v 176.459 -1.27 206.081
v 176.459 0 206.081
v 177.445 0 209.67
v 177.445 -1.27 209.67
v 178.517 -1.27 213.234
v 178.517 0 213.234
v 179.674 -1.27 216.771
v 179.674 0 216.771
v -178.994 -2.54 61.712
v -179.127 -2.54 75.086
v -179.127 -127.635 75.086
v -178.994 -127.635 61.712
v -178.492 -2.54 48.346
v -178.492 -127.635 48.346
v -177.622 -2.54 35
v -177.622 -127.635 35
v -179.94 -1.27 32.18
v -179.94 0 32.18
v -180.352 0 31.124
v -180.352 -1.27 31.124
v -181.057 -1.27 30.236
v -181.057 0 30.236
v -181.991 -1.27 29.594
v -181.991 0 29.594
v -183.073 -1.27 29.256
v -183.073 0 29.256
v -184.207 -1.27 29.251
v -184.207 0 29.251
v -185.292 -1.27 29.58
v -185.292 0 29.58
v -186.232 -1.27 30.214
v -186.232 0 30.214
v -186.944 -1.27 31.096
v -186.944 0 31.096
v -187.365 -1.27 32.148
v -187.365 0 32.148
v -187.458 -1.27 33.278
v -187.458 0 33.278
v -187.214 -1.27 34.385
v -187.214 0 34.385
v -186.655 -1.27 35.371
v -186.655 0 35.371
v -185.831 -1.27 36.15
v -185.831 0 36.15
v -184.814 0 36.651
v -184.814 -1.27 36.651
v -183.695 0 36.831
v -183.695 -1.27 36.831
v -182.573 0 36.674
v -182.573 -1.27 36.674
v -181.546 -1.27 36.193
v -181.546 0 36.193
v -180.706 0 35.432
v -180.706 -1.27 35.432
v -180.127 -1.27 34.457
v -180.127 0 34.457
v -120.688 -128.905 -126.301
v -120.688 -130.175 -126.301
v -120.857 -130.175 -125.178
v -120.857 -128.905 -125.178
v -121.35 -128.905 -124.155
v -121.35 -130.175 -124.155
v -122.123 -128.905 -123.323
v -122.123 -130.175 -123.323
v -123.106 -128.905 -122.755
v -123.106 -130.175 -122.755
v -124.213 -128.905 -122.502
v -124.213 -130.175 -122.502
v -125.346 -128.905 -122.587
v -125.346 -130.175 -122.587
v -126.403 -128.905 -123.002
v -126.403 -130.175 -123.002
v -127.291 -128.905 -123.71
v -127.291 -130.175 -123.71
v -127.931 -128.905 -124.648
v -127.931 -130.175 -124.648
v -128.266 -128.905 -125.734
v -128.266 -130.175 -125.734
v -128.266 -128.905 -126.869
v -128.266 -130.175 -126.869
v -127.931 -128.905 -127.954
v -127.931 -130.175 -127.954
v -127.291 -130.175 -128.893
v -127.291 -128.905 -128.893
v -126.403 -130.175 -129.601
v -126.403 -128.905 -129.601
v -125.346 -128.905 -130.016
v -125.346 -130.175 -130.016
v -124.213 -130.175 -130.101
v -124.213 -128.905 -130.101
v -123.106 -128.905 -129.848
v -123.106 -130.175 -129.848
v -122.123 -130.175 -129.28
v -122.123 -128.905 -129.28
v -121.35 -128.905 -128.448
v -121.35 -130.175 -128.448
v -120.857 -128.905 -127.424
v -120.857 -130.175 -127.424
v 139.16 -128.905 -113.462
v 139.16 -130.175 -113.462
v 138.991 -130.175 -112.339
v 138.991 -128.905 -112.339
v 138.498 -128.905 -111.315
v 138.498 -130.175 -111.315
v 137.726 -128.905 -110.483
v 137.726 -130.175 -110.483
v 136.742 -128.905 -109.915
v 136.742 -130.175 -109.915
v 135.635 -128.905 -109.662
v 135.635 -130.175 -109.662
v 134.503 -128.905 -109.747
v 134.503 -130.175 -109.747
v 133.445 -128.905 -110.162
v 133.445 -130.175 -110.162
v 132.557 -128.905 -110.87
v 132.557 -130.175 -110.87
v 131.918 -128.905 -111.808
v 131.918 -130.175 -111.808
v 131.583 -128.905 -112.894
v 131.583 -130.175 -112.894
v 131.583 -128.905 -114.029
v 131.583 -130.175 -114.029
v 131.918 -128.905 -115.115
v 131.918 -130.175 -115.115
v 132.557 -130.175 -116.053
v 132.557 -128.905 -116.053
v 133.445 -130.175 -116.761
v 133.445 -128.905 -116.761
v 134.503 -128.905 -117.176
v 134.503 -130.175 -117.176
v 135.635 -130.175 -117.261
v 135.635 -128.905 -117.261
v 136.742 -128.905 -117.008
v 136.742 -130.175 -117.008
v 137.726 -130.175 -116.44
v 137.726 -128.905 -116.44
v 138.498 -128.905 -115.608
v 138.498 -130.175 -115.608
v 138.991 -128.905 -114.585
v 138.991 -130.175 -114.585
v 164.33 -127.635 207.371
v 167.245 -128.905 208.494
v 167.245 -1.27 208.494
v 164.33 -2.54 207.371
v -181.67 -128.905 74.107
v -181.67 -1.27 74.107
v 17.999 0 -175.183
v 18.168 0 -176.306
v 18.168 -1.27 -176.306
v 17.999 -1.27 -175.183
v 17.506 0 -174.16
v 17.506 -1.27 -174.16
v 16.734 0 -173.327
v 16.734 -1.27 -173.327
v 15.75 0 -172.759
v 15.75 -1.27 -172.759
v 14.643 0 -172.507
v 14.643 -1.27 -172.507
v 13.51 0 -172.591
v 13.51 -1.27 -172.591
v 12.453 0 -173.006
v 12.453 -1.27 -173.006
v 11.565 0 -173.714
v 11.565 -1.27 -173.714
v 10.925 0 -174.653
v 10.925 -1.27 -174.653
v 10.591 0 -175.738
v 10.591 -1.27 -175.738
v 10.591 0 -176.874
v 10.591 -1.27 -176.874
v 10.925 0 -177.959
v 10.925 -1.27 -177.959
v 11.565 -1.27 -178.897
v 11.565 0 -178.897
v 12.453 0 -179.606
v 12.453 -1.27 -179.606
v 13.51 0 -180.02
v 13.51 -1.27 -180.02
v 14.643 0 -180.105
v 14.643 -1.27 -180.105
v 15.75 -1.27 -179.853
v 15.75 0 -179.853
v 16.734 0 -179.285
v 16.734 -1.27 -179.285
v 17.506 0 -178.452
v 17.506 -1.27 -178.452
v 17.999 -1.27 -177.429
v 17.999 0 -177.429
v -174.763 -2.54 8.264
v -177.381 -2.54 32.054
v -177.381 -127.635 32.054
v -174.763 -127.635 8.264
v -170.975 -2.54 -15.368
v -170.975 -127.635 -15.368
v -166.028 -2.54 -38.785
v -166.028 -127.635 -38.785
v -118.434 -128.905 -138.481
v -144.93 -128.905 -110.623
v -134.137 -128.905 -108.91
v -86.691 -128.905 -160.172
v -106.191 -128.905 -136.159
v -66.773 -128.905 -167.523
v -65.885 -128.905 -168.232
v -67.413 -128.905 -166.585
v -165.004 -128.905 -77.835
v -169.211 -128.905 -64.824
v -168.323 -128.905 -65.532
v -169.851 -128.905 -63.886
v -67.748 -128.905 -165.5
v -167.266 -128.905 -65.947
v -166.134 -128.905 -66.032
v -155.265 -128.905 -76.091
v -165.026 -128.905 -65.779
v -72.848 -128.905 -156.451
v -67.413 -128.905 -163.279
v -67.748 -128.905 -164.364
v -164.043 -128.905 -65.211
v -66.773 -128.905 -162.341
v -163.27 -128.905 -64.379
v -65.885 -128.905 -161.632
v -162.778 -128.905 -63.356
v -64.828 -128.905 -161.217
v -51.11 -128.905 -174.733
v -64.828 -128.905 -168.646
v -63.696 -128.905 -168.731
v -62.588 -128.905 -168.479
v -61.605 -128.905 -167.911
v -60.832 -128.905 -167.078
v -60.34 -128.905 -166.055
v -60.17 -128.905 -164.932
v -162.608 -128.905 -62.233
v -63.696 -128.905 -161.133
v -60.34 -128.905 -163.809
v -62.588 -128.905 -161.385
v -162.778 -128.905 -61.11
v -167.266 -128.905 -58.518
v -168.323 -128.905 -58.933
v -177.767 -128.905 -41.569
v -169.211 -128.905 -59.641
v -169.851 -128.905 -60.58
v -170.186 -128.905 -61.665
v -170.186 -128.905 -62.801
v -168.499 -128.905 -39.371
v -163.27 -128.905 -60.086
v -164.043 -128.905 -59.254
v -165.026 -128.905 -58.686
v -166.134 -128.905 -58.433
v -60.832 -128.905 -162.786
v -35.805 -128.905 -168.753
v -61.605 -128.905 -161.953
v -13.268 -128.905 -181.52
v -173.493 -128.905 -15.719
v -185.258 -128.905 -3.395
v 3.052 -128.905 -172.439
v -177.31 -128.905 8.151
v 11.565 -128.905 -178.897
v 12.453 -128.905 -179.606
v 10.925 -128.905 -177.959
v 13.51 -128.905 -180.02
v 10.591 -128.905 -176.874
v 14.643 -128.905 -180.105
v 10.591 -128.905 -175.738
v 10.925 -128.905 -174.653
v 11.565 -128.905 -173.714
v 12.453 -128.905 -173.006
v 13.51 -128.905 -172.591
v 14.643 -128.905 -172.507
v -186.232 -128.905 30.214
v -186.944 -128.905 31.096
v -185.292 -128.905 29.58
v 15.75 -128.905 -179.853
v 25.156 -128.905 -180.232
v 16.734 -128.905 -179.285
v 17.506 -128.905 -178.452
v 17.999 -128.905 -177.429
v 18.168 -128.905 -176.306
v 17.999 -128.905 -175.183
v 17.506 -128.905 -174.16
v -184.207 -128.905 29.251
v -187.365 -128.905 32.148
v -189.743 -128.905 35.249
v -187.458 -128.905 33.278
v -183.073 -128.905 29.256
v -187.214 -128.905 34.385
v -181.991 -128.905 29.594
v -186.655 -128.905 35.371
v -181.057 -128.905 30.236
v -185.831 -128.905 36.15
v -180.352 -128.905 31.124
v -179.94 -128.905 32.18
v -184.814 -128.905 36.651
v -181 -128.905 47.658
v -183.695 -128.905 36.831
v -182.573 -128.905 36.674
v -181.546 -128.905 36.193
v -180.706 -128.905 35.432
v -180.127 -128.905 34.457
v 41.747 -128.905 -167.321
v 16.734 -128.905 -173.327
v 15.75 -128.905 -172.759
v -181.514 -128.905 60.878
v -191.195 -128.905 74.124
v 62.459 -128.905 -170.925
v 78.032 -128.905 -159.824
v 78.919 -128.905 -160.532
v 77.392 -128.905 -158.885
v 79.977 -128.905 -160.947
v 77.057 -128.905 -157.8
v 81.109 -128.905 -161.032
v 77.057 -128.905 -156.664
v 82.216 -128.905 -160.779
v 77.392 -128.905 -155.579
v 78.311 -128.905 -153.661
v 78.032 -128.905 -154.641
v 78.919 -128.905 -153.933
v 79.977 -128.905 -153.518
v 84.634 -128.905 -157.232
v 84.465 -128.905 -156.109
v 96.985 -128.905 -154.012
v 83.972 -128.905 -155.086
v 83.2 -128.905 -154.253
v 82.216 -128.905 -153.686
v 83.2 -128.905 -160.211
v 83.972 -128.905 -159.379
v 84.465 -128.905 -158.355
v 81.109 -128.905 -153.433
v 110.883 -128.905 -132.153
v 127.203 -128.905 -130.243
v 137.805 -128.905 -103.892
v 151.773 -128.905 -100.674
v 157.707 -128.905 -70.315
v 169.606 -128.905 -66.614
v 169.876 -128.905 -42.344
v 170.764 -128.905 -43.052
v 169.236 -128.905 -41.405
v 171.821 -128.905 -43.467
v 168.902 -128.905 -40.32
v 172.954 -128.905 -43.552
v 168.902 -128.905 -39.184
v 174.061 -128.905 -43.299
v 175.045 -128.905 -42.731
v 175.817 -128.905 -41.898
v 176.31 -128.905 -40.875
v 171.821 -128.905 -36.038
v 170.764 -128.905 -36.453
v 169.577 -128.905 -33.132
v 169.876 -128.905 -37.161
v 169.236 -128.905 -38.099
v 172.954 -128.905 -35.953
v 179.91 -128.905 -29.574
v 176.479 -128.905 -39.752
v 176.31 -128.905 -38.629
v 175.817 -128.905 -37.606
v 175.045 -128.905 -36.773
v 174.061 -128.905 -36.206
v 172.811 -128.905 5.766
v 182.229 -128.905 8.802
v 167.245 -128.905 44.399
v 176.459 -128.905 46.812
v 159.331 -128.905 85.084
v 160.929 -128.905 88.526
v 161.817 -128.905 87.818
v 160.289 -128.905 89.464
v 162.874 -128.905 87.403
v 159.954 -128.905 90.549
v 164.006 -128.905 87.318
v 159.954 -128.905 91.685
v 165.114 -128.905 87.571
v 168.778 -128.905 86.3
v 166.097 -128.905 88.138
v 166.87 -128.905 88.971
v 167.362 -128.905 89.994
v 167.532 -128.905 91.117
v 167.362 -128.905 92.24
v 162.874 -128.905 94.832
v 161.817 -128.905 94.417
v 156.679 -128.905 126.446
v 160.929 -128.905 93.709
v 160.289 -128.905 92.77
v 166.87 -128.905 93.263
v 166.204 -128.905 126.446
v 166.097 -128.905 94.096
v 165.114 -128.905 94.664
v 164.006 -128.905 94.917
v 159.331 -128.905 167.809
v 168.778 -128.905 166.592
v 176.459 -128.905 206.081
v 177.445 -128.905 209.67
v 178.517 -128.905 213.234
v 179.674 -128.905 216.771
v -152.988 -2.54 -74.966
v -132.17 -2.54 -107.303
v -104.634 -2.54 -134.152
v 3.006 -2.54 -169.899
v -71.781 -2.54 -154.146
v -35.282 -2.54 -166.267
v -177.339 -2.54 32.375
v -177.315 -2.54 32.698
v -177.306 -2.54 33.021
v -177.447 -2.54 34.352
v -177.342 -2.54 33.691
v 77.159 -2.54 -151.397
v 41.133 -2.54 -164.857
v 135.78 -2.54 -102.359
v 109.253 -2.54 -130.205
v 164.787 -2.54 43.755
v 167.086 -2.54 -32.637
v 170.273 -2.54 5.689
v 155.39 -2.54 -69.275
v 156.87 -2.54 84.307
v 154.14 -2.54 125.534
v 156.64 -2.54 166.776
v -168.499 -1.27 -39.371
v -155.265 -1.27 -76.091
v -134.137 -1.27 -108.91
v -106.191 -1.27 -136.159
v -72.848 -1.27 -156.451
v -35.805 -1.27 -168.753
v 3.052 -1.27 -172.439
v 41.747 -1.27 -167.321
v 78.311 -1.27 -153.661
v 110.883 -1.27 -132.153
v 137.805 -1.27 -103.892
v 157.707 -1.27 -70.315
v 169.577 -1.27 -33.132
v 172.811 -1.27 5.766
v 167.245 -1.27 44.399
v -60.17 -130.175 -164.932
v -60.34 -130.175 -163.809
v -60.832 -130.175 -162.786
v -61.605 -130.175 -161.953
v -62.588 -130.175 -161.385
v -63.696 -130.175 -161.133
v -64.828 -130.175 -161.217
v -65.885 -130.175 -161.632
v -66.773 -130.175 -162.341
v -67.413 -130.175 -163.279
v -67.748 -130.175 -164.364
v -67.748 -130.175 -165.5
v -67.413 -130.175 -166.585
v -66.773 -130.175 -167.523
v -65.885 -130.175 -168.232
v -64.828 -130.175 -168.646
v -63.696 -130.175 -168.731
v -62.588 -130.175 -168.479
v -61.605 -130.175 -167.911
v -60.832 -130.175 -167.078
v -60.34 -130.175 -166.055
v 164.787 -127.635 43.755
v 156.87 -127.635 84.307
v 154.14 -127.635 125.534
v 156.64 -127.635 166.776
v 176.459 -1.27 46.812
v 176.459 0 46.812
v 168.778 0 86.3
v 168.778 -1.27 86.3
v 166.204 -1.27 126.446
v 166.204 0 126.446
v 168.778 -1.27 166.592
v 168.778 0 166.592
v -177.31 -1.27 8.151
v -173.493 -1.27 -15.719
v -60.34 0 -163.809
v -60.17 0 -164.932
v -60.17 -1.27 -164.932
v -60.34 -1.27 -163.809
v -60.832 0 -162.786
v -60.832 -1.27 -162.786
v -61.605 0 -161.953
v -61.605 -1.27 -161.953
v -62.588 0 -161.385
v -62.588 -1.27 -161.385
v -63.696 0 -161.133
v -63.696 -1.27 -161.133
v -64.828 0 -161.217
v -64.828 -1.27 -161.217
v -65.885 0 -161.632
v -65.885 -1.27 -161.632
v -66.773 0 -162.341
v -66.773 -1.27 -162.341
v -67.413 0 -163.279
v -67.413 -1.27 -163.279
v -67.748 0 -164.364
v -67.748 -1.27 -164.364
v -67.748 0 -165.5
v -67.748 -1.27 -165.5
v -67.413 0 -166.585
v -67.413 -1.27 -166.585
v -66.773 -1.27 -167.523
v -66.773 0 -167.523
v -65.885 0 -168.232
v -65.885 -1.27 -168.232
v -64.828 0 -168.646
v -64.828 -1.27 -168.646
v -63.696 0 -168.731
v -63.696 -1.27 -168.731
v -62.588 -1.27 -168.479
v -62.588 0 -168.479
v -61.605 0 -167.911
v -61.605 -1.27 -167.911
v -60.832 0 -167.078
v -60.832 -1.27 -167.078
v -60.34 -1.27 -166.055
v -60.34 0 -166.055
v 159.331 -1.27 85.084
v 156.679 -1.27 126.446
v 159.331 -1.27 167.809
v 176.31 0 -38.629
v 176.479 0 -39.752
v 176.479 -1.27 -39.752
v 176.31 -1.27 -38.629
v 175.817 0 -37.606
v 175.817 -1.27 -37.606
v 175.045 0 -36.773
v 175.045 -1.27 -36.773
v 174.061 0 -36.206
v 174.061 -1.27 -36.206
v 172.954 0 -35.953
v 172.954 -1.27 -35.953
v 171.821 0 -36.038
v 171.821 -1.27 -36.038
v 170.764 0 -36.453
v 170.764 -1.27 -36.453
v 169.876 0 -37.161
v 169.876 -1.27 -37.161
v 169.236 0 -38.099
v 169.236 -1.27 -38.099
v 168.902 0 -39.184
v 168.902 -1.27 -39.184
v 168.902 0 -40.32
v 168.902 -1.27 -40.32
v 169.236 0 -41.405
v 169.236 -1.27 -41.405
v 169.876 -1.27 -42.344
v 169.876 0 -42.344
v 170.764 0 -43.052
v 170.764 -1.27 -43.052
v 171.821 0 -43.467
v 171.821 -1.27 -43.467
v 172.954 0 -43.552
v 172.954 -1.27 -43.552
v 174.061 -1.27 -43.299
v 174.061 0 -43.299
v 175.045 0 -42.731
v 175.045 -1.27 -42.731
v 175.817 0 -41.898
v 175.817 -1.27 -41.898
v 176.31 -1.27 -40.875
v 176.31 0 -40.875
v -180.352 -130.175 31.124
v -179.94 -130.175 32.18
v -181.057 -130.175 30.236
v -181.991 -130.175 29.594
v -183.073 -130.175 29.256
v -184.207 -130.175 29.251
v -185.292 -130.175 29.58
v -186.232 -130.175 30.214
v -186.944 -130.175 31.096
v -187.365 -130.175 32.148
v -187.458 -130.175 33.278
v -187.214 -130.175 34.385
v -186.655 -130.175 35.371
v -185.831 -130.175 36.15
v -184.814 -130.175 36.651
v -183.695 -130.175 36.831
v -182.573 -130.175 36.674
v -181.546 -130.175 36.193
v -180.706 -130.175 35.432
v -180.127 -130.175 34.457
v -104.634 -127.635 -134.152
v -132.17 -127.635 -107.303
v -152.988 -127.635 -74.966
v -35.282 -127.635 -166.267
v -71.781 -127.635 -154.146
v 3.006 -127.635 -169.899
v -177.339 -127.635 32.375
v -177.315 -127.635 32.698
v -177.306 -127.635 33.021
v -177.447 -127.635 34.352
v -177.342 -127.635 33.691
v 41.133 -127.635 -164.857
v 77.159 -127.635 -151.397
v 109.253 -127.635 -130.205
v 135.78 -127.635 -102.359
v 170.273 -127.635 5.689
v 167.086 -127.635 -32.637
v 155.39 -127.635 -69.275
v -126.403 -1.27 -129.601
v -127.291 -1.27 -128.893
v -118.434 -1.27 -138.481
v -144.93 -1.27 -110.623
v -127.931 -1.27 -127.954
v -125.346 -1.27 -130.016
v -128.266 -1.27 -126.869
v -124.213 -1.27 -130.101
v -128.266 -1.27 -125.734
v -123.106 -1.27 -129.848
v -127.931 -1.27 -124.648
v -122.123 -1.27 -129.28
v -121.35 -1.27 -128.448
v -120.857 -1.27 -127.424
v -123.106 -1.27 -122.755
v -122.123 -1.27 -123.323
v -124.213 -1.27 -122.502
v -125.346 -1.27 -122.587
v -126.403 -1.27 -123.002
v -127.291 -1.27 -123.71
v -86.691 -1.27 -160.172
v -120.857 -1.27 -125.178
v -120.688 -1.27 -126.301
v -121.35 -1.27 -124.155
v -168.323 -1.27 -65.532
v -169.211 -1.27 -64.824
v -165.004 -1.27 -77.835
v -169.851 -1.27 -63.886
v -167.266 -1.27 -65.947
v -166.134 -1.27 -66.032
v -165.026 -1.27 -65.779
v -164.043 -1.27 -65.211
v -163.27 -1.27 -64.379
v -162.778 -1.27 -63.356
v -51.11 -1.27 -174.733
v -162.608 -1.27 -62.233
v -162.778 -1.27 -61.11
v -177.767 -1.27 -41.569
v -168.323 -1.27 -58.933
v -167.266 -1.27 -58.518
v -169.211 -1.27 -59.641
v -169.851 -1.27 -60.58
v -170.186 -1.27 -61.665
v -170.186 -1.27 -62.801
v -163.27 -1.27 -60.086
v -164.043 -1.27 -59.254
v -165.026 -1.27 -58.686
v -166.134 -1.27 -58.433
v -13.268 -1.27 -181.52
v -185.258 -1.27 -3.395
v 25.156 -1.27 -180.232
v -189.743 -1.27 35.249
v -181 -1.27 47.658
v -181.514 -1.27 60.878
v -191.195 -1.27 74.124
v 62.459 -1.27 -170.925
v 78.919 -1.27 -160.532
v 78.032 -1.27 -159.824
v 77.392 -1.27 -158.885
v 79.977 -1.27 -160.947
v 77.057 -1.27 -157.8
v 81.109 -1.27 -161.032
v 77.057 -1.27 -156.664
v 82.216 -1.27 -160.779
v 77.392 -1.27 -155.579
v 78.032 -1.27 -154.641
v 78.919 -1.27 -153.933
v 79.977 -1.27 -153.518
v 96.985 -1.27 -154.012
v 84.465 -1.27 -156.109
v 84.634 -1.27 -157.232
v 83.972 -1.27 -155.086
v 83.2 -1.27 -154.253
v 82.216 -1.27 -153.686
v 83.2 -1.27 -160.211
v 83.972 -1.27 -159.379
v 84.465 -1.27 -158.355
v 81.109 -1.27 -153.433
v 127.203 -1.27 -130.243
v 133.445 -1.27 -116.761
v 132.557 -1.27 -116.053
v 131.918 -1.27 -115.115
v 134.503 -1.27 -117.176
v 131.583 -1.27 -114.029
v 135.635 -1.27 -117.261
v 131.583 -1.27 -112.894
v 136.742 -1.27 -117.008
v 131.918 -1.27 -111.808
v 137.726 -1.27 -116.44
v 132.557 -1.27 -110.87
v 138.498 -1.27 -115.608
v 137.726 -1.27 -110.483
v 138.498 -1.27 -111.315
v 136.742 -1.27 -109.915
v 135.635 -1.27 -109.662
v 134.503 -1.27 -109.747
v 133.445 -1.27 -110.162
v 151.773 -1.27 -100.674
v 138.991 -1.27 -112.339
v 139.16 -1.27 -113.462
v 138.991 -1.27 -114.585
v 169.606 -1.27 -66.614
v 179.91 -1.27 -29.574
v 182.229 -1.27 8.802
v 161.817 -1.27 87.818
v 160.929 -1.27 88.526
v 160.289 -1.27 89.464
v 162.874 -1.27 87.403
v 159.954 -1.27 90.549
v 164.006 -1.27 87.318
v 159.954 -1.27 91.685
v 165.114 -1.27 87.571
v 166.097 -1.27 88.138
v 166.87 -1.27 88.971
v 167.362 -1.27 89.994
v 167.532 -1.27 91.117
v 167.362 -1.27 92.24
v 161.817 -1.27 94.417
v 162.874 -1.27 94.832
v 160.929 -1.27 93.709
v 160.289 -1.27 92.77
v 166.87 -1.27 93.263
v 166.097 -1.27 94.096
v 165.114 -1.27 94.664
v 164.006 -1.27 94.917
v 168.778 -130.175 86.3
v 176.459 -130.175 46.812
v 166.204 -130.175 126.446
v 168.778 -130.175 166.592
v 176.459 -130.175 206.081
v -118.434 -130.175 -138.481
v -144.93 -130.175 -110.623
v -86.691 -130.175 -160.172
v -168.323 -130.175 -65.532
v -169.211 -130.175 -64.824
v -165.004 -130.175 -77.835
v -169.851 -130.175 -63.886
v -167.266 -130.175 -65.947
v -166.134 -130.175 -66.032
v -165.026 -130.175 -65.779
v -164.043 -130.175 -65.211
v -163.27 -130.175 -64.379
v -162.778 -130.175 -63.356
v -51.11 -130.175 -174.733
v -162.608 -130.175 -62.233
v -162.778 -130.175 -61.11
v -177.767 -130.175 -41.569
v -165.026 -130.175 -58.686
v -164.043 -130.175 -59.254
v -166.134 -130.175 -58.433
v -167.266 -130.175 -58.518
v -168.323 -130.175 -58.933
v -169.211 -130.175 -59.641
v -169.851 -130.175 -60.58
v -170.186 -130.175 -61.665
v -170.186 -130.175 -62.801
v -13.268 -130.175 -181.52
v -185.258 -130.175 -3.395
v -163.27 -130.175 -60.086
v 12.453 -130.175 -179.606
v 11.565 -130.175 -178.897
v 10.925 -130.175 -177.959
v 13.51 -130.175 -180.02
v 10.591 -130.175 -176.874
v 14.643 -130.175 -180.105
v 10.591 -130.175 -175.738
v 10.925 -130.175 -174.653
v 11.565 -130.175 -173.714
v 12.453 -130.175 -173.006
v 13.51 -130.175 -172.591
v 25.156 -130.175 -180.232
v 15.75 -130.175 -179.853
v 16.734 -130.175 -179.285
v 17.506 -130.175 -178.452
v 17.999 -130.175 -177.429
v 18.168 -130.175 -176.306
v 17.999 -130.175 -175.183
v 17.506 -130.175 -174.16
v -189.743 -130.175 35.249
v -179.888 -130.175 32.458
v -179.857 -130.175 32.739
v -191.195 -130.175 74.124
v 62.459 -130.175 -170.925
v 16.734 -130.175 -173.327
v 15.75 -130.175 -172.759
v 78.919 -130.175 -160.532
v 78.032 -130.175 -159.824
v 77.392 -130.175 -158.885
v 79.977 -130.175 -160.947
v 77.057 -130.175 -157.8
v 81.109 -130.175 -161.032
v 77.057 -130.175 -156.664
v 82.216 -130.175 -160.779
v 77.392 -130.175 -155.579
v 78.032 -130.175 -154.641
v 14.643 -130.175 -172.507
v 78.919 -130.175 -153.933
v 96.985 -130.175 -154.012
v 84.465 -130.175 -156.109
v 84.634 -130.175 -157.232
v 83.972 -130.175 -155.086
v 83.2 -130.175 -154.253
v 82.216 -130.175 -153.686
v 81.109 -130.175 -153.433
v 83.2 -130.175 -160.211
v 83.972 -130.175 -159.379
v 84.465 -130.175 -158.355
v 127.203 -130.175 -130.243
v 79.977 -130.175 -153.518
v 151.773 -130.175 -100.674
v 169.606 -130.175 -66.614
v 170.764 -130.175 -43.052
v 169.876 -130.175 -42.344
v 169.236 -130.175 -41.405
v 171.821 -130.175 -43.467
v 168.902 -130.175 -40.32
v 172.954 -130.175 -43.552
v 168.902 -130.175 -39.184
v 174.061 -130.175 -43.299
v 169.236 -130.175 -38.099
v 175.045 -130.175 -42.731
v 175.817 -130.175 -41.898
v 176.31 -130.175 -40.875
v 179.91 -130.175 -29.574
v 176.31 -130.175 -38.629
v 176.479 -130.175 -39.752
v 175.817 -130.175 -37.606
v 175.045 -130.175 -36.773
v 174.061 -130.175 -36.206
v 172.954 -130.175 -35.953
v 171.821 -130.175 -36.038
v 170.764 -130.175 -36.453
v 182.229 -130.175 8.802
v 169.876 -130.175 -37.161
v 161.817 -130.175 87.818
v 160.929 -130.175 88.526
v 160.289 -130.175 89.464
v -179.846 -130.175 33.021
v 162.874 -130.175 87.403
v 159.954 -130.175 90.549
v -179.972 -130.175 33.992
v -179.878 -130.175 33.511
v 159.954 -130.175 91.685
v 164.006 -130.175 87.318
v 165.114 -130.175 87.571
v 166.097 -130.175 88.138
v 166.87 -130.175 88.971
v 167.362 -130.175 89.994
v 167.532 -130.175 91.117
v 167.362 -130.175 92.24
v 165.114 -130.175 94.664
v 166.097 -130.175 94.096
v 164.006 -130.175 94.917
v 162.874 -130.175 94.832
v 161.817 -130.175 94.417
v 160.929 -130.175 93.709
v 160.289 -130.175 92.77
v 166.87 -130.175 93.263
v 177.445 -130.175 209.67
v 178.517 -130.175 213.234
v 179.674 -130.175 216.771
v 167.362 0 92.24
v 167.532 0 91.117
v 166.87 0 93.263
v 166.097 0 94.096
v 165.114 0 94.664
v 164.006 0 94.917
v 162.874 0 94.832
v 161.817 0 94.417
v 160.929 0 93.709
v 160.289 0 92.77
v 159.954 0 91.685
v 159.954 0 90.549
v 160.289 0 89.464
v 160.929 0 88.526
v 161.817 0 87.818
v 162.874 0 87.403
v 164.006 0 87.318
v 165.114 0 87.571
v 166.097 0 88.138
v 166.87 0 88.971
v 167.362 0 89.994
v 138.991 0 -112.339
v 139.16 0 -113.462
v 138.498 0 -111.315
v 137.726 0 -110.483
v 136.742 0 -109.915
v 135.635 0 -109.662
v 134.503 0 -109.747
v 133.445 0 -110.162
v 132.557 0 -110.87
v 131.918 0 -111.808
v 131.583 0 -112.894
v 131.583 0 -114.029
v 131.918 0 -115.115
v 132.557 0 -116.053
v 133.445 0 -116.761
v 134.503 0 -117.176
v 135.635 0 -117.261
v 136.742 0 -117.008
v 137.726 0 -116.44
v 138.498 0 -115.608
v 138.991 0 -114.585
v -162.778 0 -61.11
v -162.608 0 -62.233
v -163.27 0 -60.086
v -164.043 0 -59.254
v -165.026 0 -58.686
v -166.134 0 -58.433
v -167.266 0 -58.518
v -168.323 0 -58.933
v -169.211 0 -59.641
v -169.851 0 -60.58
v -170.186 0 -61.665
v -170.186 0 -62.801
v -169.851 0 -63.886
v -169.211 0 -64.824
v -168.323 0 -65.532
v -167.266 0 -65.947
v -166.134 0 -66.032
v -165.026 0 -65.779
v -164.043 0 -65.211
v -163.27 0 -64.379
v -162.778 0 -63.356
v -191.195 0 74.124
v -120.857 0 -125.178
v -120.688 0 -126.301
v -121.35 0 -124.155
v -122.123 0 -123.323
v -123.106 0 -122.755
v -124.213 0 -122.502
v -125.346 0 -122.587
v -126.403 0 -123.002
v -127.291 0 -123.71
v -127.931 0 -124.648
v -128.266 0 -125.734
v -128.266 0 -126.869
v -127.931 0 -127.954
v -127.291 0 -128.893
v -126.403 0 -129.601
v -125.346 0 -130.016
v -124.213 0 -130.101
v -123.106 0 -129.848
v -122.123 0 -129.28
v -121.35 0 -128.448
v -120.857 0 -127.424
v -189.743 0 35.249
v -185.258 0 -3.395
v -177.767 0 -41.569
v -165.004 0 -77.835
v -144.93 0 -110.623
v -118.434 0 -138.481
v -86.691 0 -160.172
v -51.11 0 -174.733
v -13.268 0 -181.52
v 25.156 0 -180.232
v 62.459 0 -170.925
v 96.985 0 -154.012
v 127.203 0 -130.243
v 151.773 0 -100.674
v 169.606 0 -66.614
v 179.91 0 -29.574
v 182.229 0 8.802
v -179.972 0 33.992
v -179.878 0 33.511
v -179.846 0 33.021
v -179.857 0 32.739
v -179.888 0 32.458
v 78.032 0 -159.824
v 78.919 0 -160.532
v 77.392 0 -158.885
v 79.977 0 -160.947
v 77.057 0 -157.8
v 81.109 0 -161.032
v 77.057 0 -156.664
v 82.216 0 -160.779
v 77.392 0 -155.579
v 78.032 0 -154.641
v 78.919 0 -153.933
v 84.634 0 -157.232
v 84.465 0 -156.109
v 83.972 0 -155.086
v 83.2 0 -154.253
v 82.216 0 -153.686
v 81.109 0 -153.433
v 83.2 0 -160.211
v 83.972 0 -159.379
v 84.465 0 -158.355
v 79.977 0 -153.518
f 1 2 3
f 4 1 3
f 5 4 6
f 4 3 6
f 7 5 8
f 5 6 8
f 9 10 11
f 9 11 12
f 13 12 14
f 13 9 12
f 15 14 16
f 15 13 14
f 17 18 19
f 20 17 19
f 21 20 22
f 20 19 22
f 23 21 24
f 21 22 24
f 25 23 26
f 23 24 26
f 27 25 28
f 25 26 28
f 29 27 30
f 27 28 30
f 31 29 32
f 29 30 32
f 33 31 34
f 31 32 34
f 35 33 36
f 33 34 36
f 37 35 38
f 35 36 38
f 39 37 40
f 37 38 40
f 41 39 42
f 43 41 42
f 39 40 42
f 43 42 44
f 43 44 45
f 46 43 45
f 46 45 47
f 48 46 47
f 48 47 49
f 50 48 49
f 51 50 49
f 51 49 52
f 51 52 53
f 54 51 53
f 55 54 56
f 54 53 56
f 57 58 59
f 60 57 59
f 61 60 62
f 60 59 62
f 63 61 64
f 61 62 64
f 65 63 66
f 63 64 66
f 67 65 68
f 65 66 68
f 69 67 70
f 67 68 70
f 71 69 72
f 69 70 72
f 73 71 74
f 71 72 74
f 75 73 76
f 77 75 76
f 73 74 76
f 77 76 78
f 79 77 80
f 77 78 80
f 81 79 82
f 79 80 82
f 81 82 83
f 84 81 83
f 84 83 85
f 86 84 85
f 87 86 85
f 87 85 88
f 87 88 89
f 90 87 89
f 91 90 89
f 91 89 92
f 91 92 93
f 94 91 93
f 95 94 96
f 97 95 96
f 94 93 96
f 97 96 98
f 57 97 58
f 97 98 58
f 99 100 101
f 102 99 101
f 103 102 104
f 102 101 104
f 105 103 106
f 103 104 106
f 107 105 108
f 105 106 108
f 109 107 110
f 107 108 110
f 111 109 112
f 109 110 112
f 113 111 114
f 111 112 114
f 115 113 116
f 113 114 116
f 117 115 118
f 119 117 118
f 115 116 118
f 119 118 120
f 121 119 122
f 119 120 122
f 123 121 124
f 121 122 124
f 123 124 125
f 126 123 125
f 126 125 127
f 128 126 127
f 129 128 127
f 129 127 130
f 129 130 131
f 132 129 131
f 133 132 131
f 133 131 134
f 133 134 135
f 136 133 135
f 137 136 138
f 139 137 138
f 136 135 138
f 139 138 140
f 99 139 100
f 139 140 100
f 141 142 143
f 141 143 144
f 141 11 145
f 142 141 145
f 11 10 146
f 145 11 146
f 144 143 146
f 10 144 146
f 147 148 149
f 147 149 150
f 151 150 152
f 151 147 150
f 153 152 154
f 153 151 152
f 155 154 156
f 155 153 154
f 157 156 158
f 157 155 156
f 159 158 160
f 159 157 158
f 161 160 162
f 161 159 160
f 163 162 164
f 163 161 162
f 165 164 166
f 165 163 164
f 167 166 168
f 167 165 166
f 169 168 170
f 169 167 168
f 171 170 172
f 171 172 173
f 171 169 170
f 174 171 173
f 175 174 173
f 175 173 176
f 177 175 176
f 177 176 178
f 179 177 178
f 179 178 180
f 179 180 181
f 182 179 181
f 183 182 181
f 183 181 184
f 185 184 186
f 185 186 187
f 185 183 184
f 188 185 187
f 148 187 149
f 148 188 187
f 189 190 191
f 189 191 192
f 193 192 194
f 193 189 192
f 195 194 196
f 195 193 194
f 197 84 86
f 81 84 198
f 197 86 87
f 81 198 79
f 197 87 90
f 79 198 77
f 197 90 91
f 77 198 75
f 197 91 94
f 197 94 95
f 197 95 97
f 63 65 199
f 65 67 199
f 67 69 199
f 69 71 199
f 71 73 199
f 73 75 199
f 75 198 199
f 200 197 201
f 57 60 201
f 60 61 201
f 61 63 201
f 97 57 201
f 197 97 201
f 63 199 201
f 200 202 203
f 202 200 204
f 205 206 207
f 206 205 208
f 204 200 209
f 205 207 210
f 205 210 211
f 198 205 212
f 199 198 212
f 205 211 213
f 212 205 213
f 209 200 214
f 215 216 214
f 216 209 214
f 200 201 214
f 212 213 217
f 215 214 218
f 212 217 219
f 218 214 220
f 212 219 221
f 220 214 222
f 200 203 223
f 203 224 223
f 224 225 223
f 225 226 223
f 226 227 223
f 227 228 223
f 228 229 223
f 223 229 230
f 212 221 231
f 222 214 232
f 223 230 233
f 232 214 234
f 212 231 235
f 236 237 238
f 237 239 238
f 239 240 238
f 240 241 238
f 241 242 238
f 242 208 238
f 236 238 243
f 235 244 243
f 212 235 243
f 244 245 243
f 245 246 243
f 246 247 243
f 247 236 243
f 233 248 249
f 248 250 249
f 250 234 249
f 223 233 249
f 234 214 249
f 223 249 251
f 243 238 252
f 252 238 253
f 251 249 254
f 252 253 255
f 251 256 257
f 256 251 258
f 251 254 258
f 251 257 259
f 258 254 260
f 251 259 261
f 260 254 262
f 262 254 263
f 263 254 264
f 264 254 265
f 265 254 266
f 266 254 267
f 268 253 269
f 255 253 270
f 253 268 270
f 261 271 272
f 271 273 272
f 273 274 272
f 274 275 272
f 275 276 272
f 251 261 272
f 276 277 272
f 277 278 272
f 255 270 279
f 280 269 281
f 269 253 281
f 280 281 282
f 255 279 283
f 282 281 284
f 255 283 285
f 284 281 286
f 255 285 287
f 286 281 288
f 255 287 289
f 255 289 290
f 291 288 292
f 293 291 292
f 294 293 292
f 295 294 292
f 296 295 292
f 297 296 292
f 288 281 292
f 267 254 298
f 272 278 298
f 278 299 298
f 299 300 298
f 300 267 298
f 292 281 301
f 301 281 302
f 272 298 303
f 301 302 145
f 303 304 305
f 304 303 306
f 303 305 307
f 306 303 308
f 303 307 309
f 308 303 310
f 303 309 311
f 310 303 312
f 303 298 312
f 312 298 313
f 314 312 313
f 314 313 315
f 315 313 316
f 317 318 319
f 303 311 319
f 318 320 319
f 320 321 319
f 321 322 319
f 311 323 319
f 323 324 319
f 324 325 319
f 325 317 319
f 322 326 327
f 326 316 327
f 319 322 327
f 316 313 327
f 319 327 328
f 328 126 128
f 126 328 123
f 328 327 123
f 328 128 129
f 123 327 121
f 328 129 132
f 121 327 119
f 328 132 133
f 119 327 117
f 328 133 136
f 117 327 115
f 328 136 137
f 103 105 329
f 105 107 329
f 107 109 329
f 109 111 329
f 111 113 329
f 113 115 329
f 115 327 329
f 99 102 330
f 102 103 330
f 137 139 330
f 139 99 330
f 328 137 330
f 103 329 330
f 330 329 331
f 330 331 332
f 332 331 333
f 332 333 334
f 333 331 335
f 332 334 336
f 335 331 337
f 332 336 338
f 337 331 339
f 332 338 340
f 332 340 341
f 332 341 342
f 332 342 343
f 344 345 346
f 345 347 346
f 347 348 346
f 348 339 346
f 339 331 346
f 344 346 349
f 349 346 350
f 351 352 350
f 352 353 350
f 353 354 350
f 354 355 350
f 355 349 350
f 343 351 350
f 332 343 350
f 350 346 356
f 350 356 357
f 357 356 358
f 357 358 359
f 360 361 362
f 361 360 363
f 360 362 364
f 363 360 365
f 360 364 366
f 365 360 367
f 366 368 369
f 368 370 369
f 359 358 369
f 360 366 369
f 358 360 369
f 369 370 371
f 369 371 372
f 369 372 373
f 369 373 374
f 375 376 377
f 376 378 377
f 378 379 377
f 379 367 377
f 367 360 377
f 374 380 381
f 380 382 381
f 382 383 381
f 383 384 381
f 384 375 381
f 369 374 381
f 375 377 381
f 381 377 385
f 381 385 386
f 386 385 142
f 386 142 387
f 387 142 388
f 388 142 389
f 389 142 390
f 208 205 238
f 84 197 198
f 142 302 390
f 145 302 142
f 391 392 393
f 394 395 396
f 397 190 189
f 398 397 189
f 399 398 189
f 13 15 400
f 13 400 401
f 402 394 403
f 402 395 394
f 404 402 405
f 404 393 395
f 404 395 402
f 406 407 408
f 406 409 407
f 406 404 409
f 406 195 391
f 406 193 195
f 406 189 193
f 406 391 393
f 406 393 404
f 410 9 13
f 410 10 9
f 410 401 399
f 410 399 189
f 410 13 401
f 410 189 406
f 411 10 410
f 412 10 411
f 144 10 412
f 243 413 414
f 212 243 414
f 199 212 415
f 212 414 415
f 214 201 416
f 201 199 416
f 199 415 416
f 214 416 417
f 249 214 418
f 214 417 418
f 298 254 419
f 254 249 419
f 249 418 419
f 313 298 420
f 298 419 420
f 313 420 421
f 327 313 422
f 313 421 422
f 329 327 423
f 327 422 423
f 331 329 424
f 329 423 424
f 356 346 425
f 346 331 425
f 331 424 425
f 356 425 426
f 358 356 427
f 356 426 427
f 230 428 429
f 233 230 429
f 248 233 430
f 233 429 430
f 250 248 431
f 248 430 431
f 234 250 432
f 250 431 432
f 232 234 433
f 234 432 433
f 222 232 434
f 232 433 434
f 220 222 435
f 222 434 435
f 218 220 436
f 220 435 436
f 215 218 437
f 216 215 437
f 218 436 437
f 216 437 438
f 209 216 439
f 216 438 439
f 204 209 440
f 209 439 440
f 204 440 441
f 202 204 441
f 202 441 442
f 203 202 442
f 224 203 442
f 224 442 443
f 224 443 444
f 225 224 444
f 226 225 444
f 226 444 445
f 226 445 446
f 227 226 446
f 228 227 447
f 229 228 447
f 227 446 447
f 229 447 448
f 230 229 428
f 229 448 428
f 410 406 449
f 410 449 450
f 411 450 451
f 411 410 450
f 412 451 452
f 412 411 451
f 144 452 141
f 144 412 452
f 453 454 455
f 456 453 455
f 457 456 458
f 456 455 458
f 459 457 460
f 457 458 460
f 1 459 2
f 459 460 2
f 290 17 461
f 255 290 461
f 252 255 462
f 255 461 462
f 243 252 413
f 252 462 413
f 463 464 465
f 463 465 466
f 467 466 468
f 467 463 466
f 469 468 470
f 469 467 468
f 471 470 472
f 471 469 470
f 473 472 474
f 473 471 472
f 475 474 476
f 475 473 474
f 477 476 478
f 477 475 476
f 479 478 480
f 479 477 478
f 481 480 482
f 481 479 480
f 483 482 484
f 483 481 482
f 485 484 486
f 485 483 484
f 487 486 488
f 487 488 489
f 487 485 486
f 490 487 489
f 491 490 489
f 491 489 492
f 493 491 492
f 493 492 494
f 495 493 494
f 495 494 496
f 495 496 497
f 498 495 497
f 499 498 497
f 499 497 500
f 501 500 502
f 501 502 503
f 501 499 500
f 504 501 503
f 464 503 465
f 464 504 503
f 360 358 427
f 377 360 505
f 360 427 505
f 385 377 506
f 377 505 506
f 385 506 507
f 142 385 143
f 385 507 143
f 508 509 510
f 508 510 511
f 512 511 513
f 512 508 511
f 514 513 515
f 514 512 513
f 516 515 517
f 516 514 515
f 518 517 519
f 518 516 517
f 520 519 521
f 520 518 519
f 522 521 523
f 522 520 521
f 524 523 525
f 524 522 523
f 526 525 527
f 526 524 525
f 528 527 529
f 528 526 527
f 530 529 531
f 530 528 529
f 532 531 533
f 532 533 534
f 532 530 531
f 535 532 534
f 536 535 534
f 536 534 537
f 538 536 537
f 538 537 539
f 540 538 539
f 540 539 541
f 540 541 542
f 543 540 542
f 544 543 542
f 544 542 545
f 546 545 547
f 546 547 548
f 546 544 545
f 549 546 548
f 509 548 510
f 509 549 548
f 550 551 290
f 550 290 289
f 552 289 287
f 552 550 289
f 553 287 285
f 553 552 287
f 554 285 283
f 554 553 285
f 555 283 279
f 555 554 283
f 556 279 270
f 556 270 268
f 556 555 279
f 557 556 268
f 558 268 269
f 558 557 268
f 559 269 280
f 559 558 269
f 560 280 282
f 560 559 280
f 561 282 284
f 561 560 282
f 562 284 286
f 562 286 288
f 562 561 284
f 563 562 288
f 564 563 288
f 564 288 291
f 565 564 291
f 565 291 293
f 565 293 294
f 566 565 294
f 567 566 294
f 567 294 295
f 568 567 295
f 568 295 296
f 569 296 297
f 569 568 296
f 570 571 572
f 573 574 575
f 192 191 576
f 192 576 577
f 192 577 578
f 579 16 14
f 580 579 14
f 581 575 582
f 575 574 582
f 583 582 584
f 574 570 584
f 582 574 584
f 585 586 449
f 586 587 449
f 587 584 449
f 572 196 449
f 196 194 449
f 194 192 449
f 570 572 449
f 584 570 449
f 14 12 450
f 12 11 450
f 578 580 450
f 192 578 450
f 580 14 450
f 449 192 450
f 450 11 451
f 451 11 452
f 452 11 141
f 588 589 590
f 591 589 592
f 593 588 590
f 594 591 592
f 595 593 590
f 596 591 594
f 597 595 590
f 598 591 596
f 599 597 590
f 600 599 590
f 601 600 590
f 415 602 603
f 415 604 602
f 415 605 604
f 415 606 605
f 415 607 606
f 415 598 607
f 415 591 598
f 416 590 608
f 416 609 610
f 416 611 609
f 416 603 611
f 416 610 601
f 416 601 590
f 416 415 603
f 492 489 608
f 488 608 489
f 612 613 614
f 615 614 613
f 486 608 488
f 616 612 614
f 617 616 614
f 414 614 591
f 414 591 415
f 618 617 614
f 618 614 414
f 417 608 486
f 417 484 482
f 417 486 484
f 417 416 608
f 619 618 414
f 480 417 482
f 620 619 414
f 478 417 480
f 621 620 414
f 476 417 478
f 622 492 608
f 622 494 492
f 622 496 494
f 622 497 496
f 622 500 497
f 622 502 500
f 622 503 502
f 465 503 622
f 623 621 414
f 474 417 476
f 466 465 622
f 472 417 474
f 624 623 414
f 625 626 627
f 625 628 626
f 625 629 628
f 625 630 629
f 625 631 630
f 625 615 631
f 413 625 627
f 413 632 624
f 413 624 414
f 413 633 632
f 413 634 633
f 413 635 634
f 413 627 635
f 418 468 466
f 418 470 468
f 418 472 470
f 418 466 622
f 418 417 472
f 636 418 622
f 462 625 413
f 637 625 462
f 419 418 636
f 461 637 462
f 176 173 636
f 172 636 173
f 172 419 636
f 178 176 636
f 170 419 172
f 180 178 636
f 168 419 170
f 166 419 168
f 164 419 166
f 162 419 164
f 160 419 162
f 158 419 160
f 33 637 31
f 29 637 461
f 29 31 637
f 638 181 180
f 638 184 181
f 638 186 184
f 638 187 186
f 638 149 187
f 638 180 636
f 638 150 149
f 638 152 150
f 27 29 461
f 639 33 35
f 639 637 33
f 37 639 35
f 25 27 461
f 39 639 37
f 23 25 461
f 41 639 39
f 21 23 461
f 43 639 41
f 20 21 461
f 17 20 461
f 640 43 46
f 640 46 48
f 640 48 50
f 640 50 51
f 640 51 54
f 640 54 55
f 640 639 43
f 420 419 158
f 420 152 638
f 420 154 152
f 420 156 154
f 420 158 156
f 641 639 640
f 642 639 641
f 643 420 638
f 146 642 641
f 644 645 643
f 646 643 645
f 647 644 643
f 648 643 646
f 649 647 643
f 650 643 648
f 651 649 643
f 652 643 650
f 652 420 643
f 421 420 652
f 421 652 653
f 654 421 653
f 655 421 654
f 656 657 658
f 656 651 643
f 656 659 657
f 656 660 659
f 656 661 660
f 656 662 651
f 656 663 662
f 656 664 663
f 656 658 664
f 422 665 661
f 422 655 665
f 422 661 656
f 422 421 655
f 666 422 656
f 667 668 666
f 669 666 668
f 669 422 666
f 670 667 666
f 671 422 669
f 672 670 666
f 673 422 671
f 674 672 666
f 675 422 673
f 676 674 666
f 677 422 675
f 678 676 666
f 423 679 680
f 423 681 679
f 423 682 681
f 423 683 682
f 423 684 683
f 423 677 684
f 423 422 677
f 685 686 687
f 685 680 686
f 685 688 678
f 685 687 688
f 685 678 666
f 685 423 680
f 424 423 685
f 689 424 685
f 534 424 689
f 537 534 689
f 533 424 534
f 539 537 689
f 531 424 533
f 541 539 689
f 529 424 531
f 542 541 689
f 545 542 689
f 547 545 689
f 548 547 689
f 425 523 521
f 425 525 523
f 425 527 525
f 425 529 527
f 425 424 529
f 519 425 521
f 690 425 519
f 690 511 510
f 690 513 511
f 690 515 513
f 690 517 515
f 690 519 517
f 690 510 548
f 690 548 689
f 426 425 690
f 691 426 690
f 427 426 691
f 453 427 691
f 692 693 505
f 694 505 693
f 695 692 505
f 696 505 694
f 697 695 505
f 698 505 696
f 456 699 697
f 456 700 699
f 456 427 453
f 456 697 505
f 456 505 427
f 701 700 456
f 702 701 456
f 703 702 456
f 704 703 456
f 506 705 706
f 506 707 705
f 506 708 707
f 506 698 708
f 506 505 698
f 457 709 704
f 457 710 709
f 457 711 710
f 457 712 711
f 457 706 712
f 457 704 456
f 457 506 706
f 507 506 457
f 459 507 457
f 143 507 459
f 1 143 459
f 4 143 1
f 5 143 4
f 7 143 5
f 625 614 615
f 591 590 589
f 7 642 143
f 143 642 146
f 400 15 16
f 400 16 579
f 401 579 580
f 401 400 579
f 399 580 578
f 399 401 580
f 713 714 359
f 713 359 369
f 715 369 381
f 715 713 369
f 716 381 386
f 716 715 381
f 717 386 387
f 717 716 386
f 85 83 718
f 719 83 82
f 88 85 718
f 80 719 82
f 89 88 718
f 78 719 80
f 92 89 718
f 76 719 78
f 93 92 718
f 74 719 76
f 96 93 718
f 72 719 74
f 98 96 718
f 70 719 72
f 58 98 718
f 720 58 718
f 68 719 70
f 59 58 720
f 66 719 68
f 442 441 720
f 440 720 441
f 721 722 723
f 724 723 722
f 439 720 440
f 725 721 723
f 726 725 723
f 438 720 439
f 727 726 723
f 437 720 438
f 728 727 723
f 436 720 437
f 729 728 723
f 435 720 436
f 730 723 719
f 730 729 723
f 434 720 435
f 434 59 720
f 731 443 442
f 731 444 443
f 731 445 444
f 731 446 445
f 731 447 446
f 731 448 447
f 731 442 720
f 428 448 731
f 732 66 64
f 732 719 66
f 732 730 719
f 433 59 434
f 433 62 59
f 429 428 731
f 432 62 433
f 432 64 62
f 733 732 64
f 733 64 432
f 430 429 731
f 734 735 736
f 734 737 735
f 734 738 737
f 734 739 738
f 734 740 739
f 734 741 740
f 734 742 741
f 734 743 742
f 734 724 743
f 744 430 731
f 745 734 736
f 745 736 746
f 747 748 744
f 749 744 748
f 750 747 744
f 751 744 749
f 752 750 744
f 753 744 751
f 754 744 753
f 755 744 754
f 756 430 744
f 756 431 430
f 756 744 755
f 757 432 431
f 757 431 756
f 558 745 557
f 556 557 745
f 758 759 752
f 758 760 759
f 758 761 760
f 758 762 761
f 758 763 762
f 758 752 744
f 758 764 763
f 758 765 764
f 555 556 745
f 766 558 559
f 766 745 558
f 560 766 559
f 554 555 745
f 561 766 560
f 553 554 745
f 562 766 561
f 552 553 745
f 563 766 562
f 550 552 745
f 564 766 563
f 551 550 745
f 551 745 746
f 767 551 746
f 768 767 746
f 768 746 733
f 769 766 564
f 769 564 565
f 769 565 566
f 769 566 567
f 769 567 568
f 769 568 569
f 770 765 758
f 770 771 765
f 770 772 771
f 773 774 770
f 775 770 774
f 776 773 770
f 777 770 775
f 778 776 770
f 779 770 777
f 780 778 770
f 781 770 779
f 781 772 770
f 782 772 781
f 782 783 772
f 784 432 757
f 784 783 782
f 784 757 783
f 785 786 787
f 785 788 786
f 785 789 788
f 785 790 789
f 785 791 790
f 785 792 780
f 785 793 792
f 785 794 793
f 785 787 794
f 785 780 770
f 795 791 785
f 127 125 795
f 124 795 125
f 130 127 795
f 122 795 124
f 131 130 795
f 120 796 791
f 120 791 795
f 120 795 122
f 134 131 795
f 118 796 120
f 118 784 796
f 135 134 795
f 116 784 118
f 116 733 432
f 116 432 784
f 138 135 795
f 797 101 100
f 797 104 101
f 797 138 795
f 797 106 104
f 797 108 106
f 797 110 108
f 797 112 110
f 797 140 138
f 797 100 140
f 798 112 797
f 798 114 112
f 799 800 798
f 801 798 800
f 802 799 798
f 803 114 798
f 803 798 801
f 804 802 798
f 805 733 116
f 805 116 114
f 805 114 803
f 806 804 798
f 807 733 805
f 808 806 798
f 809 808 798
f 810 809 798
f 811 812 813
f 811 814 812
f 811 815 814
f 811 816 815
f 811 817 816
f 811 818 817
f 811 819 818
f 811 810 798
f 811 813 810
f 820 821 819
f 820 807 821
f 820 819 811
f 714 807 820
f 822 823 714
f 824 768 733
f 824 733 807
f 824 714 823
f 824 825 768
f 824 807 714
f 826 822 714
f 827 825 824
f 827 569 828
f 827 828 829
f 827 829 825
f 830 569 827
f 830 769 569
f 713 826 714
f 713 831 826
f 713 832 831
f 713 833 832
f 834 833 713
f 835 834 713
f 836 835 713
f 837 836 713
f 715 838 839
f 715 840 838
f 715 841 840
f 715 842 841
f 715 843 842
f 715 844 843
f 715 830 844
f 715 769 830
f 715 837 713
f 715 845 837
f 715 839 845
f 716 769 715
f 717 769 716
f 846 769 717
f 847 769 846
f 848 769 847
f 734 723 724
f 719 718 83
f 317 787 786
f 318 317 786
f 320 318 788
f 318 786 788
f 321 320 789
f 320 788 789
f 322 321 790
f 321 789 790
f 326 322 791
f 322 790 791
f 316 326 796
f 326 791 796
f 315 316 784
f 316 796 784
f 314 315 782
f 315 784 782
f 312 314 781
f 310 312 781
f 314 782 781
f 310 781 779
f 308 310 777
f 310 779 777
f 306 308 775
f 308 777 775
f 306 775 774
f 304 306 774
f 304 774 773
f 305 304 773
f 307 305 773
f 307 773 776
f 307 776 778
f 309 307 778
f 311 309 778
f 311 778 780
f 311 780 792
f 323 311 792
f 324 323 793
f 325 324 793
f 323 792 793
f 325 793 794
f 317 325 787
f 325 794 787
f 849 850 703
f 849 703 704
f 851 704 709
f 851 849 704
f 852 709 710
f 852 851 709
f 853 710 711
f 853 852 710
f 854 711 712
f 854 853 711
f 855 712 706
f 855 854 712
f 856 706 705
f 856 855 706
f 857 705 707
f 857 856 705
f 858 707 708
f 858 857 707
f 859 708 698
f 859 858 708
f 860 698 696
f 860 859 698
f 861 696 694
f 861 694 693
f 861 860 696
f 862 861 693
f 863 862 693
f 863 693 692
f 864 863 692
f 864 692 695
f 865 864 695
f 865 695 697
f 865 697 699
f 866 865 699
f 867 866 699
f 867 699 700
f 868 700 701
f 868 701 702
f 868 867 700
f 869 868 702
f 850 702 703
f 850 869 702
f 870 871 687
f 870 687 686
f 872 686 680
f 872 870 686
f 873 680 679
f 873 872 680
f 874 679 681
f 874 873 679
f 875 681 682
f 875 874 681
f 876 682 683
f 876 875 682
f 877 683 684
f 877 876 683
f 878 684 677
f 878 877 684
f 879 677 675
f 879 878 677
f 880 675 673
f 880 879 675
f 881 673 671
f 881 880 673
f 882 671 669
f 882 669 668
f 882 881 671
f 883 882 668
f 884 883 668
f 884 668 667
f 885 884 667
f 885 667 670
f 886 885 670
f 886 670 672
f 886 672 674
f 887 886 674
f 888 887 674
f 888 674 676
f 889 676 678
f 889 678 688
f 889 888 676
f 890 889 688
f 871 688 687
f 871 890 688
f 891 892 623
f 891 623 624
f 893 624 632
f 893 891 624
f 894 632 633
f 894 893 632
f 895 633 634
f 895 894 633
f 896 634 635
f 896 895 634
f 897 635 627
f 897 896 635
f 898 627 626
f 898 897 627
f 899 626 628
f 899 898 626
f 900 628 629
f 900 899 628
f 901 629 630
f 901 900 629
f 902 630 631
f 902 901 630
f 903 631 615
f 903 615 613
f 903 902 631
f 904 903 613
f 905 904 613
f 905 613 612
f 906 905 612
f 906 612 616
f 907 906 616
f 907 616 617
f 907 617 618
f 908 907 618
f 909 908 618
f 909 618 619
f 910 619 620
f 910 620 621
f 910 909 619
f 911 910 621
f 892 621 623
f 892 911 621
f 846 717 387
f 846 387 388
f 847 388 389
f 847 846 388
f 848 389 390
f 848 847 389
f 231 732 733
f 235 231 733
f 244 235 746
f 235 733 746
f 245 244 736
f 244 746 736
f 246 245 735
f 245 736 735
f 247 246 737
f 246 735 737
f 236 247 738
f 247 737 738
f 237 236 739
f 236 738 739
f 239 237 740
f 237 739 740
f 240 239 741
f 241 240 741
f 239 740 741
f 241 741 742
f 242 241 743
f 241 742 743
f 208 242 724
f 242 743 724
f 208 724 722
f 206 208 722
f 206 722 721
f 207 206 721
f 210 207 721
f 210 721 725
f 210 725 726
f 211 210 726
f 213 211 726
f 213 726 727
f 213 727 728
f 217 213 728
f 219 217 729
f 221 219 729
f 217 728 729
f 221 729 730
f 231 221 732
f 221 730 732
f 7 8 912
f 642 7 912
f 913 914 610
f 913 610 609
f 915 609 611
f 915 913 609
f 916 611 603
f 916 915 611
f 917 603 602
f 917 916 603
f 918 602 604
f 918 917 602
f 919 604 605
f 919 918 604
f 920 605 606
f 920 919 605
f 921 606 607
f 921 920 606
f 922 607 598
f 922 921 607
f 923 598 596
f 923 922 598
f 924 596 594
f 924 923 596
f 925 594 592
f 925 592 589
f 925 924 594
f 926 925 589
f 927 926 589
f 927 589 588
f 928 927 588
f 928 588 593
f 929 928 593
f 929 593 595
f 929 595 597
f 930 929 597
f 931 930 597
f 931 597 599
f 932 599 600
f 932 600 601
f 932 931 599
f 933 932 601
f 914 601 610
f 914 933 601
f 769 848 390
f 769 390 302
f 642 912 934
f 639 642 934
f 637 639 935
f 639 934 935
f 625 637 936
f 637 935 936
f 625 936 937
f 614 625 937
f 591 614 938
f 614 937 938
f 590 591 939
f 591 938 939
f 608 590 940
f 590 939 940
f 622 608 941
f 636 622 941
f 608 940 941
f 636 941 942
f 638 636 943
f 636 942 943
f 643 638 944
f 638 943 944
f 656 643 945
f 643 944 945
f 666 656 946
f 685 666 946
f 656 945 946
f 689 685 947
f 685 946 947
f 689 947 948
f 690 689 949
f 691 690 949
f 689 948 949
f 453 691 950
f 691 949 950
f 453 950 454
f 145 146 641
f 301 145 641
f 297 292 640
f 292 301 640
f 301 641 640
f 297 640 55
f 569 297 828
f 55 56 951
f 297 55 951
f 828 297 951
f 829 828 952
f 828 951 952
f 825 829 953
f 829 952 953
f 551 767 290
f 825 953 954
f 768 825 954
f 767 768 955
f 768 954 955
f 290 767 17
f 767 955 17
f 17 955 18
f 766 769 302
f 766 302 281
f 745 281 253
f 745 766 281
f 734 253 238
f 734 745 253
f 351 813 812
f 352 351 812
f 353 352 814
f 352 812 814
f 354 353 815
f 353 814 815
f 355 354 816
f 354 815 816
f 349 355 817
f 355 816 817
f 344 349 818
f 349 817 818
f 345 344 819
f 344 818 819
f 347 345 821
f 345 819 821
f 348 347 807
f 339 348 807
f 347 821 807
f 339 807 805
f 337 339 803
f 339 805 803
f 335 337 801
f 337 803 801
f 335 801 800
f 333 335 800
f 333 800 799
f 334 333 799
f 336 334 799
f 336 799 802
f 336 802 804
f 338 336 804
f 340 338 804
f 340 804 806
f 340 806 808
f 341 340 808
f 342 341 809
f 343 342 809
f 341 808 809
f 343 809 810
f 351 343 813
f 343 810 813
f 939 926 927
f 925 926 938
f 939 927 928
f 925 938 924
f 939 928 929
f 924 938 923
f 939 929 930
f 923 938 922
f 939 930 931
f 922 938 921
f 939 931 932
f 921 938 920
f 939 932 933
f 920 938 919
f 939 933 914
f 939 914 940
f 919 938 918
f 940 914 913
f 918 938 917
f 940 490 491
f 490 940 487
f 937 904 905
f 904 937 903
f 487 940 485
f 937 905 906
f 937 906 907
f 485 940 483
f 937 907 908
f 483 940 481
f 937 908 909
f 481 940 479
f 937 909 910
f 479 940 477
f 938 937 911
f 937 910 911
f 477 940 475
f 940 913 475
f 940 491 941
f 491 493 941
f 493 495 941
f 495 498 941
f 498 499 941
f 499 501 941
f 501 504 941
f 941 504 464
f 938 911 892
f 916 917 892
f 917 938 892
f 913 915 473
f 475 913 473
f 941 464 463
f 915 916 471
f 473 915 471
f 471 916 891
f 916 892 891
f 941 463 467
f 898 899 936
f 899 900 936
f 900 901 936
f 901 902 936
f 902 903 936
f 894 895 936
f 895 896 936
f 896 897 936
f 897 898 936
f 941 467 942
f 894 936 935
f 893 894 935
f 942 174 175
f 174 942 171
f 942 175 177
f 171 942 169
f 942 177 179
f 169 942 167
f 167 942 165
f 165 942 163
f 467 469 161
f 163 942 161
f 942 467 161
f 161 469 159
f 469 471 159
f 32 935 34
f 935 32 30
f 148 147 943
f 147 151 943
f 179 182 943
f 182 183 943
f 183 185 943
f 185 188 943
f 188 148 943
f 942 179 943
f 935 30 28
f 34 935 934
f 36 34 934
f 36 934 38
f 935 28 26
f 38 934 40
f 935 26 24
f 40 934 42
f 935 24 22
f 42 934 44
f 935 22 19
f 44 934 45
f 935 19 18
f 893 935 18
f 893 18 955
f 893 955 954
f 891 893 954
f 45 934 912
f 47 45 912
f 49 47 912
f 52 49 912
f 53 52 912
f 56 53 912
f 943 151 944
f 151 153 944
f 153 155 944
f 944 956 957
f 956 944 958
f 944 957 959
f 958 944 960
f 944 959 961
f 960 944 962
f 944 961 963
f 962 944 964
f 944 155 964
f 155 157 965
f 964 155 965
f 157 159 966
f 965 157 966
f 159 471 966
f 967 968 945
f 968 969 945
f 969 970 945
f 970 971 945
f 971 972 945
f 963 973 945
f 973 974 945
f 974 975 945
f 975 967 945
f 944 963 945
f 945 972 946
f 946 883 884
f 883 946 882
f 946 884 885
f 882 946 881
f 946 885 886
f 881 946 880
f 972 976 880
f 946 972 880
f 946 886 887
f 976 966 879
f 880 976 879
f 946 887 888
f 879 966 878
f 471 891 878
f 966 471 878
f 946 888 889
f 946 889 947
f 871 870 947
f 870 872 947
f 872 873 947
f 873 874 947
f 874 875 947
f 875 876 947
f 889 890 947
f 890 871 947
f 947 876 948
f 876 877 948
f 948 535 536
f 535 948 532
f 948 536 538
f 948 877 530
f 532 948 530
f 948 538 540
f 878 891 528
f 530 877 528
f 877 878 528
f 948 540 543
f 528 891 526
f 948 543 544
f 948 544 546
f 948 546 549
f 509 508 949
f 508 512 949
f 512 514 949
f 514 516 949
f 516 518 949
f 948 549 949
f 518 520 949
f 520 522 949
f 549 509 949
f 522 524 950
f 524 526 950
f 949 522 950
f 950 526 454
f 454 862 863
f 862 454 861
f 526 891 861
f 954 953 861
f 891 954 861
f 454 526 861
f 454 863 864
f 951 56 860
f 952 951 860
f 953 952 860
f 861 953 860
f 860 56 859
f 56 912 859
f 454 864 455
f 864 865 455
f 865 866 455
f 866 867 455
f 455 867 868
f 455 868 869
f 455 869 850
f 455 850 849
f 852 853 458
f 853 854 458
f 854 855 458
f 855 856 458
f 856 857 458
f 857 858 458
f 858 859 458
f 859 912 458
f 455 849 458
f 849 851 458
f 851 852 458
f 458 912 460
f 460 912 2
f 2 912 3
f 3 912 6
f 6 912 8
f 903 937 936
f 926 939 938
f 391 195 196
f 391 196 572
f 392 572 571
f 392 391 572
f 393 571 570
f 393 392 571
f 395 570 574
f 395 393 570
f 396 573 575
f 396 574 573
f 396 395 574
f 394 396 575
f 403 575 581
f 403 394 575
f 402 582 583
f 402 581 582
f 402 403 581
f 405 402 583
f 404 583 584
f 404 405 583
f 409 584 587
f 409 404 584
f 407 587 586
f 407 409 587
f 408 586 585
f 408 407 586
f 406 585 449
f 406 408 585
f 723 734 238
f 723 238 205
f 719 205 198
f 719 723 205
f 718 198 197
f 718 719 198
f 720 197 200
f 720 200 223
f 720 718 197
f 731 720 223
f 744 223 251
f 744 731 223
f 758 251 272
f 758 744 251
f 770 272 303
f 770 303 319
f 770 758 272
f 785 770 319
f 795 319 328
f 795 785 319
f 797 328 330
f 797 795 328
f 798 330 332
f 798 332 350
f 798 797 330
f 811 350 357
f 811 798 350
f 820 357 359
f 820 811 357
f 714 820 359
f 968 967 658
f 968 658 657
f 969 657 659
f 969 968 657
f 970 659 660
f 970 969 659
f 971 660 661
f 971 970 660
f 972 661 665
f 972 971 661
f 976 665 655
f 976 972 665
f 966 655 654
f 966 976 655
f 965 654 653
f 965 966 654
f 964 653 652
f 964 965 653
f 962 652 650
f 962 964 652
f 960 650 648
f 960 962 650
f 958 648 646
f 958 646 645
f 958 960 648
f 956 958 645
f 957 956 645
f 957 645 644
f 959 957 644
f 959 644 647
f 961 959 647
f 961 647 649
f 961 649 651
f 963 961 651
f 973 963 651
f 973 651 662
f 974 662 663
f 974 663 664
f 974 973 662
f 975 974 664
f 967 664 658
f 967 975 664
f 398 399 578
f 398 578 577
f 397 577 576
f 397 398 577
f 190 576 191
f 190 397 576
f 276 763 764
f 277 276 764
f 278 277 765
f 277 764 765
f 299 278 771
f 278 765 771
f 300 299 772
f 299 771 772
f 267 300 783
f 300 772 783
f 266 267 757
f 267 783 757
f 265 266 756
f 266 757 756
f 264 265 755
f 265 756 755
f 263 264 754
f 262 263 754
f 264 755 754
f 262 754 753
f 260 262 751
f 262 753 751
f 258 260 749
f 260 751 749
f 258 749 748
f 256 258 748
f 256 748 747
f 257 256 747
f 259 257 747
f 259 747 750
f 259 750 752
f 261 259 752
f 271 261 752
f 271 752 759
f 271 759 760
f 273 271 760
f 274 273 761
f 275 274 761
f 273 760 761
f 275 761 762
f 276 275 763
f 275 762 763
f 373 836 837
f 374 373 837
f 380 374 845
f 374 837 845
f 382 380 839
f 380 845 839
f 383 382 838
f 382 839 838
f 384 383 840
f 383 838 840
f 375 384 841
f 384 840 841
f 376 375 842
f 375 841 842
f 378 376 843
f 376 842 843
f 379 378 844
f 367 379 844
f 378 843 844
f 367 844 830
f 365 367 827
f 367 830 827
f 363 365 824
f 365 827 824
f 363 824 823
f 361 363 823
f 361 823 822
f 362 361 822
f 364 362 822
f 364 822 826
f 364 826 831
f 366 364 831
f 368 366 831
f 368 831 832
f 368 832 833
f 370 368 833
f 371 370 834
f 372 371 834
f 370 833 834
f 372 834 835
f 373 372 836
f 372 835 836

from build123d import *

# Parameters (mm, degrees)
F1_DEPTH = 130.175
F2_T     = -2.54
F0_R     = 3.81
F3_DEPTH = 1.27


with BuildPart() as f1:
    # F0 (on Front) → F1 (new body)
    with BuildSketch(Plane.XZ):
        with BuildLine():
            ThreePointArc((-179.94042, 32.1801), (-175.54974, -3.808035), (-168.499008, -39.370812))
            ThreePointArc((-168.499008, -39.370812), (41.747481, -167.321401), (167.244505, 44.398783))
            ThreePointArc((167.244505, 44.398783), (156.678782, 126.446336), (167.244505, 208.493888))
            Line((167.244505, 208.493888), (-181.670055, 74.106991))
            ThreePointArc((-181.670055, 74.106991), (-181.301912, 54.266409), (-180.127338, 34.457204))
            ThreePointArc((-180.127338, 34.457204), (-179.917292, 33.752862), (-179.846398, 33.021294))
            ThreePointArc((-179.846398, 33.021294), (-179.869976, 32.598078), (-179.94042, 32.1801))
        make_face()
    extrude(amount=F1_DEPTH)

    # F2
    f2_openings = [f1.faces().sort_by_distance(p)[0] for p in [
        (-7.212775, -65.0875, 141.30044),
    ]]
    offset(amount=F2_T, openings=f2_openings)

    # F0 (on Front) → F3 (join)
    with BuildSketch(Plane.XZ):
        with BuildLine():
            ThreePointArc((-191.19504, 74.123976), (-187.878519, 15.883128), (-177.76688, -41.56903))
            ThreePointArc((-177.76688, -41.56903), (44.053325, -176.563085), (176.458749, 46.81194))
            ThreePointArc((176.458749, 46.81194), (166.203782, 126.446336), (176.458749, 206.080731))
            ThreePointArc((176.458749, 206.080731), (177.970177, 211.454842), (179.674253, 216.771007))
            Line((179.674253, 216.771007), (-191.19504, 74.123976))
        make_face()
        with Locations((-124.498114, -126.301363)):
            Circle(F0_R, mode=Mode.SUBTRACT)
        with Locations((-63.980319, -164.931968)):
            Circle(F0_R, mode=Mode.SUBTRACT)
        with Locations((-166.418388, -62.232696)):
            Circle(F0_R, mode=Mode.SUBTRACT)
        with Locations((14.358005, -176.30595)):
            Circle(F0_R, mode=Mode.SUBTRACT)
        with Locations((80.824465, -157.232255)):
            Circle(F0_R, mode=Mode.SUBTRACT)
        with Locations((135.350421, -113.461576)):
            Circle(F0_R, mode=Mode.SUBTRACT)
        with Locations((172.669113, -39.752249)):
            Circle(F0_R, mode=Mode.SUBTRACT)
        with BuildLine():
            ThreePointArc((167.244505, 44.398783), (41.747481, -167.321401), (-168.499008, -39.370812))
            ThreePointArc((-168.499008, -39.370812), (-175.54974, -3.808035), (-179.94042, 32.1801))
            ThreePointArc((-179.94042, 32.1801), (-187.453626, 32.709595), (-180.127338, 34.457204))
            ThreePointArc((-180.127338, 34.457204), (-181.301912, 54.266409), (-181.670055, 74.106991))
            Line((-181.670055, 74.106991), (167.244505, 208.493888))
            ThreePointArc((167.244505, 208.493888), (156.678782, 126.446336), (167.244505, 44.398783))
        make_face(mode=Mode.SUBTRACT)
        with Locations((163.721606, 91.117166)):
            Circle(F0_R, mode=Mode.SUBTRACT)
    extrude(amount=F3_DEPTH)

    # F5: F1 across plane


with BuildPart() as f1_1:
    add(f1.part)
    add(f1.part.mirror(Plane.XZ.offset(65.0875)))


solid = f1_1.part
